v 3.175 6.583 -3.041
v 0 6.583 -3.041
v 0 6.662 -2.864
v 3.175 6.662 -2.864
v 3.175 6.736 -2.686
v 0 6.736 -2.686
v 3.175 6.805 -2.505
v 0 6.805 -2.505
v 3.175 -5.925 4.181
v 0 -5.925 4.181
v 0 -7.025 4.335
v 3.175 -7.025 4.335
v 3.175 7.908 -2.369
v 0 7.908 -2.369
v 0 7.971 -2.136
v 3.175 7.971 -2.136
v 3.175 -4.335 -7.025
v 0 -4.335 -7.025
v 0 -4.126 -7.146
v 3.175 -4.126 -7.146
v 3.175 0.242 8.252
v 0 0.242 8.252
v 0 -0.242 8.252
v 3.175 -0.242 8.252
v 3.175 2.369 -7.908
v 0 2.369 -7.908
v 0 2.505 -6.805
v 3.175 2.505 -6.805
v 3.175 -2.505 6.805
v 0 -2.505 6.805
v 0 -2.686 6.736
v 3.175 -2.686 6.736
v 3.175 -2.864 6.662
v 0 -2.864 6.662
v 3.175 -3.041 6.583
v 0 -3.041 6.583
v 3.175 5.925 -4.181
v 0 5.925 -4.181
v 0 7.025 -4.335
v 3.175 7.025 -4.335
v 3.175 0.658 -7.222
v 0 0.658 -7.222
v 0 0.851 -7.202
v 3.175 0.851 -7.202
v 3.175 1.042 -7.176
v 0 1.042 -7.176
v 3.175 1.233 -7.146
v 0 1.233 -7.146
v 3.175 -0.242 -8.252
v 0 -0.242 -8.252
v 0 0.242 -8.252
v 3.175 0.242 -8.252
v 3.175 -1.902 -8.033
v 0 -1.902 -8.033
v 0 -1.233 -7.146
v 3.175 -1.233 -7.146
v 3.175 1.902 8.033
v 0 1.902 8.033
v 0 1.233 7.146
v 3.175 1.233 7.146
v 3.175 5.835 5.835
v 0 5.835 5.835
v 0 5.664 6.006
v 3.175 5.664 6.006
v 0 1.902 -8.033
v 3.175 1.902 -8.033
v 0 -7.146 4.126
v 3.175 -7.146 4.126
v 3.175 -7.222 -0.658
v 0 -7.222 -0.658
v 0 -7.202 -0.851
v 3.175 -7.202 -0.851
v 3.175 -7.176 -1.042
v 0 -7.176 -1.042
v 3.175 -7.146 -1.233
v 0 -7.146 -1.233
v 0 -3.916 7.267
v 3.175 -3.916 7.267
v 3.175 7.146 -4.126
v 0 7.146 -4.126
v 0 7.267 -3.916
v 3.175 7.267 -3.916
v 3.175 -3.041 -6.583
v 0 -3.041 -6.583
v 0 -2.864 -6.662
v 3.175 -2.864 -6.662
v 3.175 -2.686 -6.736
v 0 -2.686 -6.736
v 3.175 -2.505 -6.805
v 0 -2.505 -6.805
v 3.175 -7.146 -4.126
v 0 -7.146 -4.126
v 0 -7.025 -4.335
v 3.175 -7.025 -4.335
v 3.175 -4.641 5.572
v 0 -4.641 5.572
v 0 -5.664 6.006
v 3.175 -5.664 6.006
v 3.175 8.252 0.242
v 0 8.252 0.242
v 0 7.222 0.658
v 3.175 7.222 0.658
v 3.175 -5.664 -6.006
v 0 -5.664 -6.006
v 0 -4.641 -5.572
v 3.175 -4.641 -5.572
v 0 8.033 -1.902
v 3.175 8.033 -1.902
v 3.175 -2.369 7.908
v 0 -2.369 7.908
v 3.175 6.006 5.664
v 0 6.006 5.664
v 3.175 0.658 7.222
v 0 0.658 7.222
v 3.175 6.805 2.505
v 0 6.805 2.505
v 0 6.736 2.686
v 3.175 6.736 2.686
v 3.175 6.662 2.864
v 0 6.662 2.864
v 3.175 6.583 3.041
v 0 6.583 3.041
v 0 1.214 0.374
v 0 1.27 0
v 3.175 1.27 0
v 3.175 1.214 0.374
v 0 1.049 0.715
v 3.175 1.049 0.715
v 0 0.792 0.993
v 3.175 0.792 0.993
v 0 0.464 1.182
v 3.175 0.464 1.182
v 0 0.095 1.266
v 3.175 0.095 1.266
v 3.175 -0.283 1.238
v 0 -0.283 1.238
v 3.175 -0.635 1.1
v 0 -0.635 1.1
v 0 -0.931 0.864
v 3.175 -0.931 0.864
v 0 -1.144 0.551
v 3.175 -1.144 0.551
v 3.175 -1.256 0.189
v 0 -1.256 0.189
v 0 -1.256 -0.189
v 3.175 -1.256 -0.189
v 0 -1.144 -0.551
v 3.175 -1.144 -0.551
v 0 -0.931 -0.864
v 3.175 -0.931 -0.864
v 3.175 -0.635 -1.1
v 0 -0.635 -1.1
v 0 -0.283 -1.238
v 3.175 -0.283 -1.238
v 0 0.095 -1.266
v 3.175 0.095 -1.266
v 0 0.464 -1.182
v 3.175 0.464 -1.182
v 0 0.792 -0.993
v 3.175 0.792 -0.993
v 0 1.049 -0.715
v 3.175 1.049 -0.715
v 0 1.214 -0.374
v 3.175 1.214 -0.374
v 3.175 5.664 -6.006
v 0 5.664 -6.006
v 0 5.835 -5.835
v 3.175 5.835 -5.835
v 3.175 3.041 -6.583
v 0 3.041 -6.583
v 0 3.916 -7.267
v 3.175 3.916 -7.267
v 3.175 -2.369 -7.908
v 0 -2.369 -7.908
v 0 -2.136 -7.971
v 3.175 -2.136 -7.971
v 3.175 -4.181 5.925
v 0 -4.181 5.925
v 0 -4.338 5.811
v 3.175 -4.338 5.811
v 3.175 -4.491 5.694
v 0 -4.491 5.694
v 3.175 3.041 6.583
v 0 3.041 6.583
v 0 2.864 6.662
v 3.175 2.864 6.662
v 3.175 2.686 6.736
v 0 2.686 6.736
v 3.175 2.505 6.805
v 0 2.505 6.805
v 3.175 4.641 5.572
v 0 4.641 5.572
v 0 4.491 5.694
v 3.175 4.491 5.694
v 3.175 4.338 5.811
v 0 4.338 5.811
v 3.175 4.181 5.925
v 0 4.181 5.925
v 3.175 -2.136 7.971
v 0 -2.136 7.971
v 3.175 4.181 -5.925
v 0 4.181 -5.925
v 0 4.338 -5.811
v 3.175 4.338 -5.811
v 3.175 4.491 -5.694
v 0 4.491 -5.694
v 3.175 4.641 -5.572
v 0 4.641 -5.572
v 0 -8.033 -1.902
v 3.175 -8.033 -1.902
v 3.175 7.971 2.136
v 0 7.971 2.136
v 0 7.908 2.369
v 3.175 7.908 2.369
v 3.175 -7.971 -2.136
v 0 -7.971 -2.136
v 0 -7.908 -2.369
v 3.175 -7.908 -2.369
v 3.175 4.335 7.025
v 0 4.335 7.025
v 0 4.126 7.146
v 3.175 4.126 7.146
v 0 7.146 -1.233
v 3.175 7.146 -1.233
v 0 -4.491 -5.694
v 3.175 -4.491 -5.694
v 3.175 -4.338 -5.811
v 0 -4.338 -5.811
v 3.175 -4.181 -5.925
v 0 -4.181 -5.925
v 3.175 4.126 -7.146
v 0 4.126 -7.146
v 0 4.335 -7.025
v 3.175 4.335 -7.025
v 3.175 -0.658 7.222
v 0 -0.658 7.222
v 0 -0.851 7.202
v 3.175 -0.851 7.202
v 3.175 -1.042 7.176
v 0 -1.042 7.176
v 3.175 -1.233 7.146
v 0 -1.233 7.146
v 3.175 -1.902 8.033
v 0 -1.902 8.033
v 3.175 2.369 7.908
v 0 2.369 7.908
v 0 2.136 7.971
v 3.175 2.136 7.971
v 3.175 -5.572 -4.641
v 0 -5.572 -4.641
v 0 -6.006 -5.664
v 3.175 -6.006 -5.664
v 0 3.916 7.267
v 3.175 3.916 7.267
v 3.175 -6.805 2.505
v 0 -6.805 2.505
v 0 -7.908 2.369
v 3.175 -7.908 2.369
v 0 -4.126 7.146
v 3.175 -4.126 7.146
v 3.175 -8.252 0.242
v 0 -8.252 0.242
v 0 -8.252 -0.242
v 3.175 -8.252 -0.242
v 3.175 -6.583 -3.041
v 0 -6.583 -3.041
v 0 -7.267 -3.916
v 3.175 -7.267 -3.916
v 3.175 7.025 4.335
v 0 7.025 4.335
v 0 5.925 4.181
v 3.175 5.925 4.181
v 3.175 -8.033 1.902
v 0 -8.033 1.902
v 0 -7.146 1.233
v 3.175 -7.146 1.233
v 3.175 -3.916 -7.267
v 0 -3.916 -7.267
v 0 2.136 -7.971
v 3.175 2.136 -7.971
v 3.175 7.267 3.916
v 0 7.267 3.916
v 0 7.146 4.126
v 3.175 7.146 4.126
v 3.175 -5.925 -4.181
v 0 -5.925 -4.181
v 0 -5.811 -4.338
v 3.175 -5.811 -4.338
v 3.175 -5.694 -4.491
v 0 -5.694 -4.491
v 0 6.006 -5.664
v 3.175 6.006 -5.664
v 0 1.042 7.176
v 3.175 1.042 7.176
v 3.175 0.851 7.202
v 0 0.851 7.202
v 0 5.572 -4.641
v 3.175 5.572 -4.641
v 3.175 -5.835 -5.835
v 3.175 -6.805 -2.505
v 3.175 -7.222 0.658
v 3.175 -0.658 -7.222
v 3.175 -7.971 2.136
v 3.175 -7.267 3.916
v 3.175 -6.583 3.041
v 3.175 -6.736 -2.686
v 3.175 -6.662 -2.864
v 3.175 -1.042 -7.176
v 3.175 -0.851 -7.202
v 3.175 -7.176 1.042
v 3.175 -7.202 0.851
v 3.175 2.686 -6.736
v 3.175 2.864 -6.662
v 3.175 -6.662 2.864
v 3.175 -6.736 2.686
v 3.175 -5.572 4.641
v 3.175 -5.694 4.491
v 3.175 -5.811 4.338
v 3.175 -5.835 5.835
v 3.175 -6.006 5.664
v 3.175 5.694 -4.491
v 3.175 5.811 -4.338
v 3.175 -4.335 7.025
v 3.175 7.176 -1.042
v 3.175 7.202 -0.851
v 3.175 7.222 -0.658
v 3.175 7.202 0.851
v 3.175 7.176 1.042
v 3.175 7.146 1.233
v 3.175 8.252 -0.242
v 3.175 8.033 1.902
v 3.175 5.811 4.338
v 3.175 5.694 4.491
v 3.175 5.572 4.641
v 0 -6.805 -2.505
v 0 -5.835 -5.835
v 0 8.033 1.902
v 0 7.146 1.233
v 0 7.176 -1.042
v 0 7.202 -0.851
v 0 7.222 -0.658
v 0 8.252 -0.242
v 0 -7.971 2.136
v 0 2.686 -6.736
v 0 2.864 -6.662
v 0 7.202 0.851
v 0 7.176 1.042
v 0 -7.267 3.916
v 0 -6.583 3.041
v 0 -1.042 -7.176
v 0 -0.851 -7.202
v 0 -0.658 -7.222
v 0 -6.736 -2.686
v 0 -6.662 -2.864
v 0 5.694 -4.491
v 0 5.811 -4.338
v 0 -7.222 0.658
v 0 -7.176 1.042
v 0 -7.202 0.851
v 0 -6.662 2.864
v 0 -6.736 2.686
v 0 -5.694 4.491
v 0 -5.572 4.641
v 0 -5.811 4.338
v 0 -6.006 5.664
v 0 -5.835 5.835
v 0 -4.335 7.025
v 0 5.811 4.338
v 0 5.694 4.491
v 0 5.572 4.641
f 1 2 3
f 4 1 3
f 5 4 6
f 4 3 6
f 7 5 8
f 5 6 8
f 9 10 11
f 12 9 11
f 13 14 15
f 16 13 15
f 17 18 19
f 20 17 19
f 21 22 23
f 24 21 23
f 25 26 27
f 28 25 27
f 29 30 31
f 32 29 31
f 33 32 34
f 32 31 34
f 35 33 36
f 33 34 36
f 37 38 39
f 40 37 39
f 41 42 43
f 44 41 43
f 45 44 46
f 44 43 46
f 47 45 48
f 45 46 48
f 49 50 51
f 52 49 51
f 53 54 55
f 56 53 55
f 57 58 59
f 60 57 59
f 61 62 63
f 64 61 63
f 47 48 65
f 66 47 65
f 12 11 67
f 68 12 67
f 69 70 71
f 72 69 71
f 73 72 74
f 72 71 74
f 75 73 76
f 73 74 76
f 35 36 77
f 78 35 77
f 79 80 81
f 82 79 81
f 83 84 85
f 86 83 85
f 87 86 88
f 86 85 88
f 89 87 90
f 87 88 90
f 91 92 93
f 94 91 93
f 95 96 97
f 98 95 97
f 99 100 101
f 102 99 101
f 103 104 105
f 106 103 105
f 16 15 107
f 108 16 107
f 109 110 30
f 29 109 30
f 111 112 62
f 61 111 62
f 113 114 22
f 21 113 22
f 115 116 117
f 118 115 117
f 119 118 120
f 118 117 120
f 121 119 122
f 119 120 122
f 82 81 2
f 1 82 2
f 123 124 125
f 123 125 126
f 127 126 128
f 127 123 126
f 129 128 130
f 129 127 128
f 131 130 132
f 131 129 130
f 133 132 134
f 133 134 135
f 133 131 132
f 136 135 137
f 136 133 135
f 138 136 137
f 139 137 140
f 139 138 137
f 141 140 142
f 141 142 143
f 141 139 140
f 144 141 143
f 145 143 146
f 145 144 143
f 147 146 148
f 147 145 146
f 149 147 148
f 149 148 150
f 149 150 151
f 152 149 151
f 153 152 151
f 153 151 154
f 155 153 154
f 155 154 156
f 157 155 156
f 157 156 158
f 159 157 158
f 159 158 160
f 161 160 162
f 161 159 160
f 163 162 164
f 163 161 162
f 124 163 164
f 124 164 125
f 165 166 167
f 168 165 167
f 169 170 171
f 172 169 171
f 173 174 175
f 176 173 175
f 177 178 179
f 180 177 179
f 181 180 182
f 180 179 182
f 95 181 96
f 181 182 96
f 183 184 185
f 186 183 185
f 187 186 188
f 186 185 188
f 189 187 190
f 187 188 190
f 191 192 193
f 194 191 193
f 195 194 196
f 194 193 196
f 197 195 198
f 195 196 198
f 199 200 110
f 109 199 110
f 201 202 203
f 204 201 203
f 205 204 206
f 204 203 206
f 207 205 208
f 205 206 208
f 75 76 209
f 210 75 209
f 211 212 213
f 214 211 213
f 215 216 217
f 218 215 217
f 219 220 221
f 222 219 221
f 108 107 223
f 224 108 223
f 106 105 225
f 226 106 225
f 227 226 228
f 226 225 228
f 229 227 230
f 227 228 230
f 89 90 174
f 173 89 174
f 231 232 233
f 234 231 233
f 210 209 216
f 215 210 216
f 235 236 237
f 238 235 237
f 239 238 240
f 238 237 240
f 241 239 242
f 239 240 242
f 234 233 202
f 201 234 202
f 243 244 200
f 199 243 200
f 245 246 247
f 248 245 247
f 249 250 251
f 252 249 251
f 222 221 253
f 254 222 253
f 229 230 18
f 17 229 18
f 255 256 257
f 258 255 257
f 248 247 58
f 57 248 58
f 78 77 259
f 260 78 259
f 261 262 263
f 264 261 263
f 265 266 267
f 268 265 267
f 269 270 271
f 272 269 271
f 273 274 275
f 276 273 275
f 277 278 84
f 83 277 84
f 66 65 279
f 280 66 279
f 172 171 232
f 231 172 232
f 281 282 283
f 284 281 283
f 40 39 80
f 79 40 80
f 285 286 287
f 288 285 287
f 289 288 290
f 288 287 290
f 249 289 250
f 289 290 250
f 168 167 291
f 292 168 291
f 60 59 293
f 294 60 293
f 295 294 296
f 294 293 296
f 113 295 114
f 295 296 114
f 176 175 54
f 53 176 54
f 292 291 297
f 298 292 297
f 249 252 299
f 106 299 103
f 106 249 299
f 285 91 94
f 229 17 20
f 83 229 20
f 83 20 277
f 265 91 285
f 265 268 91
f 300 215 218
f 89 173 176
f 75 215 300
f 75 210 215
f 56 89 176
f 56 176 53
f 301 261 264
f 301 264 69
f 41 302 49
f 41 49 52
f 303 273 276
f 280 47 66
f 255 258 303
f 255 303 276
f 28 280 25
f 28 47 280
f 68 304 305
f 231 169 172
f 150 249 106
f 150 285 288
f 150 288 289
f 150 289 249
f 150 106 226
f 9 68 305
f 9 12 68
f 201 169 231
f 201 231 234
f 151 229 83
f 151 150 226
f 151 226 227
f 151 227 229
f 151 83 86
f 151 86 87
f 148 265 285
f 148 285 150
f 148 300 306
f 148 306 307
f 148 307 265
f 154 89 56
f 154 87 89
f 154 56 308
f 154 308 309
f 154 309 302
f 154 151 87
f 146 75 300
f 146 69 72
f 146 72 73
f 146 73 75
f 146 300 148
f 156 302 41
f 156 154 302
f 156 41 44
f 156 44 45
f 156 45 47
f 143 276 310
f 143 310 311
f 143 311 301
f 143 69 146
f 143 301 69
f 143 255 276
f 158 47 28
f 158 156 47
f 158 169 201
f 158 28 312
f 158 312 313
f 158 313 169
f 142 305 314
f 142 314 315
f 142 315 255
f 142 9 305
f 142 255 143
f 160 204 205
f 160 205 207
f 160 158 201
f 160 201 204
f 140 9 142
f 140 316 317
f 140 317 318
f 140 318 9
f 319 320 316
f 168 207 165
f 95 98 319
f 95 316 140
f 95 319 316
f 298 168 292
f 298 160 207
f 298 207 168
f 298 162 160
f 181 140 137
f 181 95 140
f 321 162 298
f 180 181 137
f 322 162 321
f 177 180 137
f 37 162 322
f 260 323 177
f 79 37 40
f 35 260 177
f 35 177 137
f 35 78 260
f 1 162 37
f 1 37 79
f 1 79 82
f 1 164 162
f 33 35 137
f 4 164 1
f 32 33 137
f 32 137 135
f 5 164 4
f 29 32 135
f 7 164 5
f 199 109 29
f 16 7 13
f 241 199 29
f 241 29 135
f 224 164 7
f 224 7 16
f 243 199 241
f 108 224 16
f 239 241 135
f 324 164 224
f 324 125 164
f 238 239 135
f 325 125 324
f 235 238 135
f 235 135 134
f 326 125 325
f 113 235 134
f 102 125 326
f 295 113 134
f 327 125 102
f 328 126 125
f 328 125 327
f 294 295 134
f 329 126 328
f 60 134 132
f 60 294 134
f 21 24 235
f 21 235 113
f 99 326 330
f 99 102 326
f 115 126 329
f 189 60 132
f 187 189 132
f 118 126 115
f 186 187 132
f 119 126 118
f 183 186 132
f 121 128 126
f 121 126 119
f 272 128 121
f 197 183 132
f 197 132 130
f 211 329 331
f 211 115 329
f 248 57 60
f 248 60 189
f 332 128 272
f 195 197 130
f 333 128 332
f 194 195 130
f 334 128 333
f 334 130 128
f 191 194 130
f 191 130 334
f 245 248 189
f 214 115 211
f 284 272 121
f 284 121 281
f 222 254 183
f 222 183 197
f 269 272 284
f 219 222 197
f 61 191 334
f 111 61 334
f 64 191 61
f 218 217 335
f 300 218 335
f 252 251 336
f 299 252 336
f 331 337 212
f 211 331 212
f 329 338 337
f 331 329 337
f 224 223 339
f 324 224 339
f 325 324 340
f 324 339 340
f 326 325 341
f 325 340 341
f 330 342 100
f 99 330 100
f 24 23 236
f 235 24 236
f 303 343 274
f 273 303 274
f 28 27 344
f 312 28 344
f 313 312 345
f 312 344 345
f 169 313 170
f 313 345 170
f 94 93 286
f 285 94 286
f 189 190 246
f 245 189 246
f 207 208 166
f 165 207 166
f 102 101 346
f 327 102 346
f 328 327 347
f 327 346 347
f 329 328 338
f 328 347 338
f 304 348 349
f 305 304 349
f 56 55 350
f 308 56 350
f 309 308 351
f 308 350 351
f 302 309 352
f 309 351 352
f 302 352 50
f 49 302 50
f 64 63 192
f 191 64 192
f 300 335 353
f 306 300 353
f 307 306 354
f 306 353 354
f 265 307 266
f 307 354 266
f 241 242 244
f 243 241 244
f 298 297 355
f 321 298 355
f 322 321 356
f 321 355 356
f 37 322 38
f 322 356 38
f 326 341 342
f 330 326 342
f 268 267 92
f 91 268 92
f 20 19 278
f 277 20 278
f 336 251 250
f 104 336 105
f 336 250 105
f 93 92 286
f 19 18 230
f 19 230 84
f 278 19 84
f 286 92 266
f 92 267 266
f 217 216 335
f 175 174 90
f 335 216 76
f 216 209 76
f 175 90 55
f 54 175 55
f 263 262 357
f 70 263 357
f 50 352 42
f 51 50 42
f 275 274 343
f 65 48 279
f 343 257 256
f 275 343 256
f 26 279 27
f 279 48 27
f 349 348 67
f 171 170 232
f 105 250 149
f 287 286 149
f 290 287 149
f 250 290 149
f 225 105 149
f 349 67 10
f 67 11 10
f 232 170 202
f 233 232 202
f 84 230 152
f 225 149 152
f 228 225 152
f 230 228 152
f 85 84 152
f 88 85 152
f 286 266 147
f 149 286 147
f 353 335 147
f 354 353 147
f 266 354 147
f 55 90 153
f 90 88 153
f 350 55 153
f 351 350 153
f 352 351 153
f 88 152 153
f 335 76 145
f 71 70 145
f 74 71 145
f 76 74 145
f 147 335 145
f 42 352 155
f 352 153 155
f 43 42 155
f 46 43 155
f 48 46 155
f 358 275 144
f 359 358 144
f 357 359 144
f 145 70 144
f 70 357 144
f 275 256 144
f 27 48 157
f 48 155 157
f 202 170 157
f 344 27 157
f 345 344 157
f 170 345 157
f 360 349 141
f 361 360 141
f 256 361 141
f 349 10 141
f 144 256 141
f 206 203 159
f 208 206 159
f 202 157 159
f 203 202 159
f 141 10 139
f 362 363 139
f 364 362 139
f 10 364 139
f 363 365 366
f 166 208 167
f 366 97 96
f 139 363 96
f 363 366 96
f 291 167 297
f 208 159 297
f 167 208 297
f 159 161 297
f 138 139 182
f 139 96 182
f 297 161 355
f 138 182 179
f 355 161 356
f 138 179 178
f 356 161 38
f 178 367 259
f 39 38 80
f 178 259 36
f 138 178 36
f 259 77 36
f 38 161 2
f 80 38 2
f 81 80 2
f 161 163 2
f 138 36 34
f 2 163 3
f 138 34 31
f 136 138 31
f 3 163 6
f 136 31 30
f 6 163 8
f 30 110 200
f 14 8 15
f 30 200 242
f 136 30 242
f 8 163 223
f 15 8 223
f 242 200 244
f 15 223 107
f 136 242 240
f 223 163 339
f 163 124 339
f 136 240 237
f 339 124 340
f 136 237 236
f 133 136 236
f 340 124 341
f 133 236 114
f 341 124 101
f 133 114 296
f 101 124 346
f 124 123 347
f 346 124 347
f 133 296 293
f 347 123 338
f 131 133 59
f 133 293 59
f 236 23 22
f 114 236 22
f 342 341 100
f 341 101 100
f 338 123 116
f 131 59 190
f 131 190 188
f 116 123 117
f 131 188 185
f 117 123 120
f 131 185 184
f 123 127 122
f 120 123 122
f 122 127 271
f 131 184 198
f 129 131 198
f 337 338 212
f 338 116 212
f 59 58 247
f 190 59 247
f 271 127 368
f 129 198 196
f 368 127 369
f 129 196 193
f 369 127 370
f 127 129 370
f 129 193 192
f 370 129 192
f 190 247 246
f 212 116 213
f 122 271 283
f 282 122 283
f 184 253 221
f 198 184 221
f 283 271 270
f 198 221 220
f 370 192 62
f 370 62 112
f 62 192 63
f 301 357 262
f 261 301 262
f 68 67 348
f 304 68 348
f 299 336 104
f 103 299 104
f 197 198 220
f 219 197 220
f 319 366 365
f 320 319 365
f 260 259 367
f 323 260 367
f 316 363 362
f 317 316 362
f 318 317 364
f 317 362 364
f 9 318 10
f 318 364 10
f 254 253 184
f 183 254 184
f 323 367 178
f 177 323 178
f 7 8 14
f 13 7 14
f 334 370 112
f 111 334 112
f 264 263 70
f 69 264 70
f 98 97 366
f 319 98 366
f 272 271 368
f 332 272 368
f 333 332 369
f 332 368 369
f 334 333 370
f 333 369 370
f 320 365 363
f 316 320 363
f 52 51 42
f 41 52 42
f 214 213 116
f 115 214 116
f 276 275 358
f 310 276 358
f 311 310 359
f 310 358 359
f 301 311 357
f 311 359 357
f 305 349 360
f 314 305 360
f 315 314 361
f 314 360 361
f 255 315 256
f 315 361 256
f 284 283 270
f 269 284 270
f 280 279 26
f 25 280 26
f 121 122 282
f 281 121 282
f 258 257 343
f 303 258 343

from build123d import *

# Parameters (mm, degrees)
F0_R     = 1.27
F1_DEPTH = 3.175


with BuildPart() as f1:
    # F0 (on Right) → F1 (new body)
    with BuildSketch(Plane.YZ):
        with BuildLine():
            ThreePointArc((-0.658468, 7.221743), (0, 7.2517), (0.658468, 7.221743))
            Line((0.658468, 7.221743), (0.241805, 8.251701))
            Line((0.241805, 8.251701), (0, 8.251701))
            Line((0, 8.251701), (-0.241805, 8.251701))
            Line((-0.241805, 8.251701), (-0.658468, 7.221743))
        make_face()
        with BuildLine():
            ThreePointArc((7.221743, -0.658468), (7.244207, -0.329575), (7.2517, 0))
            ThreePointArc((7.2517, 0), (7.244207, 0.329575), (7.221743, 0.658468))
            ThreePointArc((7.221743, 0.658468), (7.189661, 0.946537), (7.146092, 1.233093))
            ThreePointArc((7.146092, 1.233093), (7.004604, 1.876878), (6.805244, 2.505156))
            ThreePointArc((6.805244, 2.505156), (6.699697, 2.775105), (6.583447, 3.040622))
            ThreePointArc((6.583447, 3.040622), (6.280156, 3.62585), (5.924979, 4.181121))
            ThreePointArc((5.924979, 4.181121), (5.75316, 4.414555), (5.572151, 4.640936))
            ThreePointArc((5.572151, 4.640936), (5.127726, 5.127726), (4.640936, 5.572151))
            ThreePointArc((4.640936, 5.572151), (4.414555, 5.75316), (4.181121, 5.924979))
            ThreePointArc((4.181121, 5.924979), (3.62585, 6.280156), (3.040622, 6.583447))
            ThreePointArc((3.040622, 6.583447), (2.775105, 6.699697), (2.505156, 6.805244))
            ThreePointArc((2.505156, 6.805244), (1.876878, 7.004604), (1.233093, 7.146092))
            ThreePointArc((1.233093, 7.146092), (0.946537, 7.189661), (0.658468, 7.221743))
            ThreePointArc((0.658468, 7.221743), (0, 7.2517), (-0.658468, 7.221743))
            ThreePointArc((-0.658468, 7.221743), (-0.946537, 7.189661), (-1.233093, 7.146092))
            ThreePointArc((-1.233093, 7.146092), (-1.876878, 7.004604), (-2.505156, 6.805244))
            ThreePointArc((-2.505156, 6.805244), (-2.775105, 6.699697), (-3.040622, 6.583447))
            ThreePointArc((-3.040622, 6.583447), (-3.62585, 6.280156), (-4.181121, 5.924979))
            ThreePointArc((-4.181121, 5.924979), (-4.414555, 5.75316), (-4.640936, 5.572151))
            ThreePointArc((-4.640936, 5.572151), (-5.127726, 5.127726), (-5.572151, 4.640936))
            ThreePointArc((-5.572151, 4.640936), (-5.75316, 4.414555), (-5.924979, 4.181121))
            ThreePointArc((-5.924979, 4.181121), (-6.280156, 3.62585), (-6.583447, 3.040622))
            ThreePointArc((-6.583447, 3.040622), (-6.699697, 2.775105), (-6.805244, 2.505156))
            ThreePointArc((-6.805244, 2.505156), (-7.004604, 1.876878), (-7.146092, 1.233093))
            ThreePointArc((-7.146092, 1.233093), (-7.189661, 0.946537), (-7.221743, 0.658468))
            ThreePointArc((-7.221743, 0.658468), (-7.2517, 0), (-7.221743, -0.658468))
            ThreePointArc((-7.221743, -0.658468), (-7.189661, -0.946537), (-7.146092, -1.233093))
            ThreePointArc((-7.146092, -1.233093), (-7.004604, -1.876878), (-6.805244, -2.505156))
            ThreePointArc((-6.805244, -2.505156), (-6.699697, -2.775105), (-6.583447, -3.040622))
            ThreePointArc((-6.583447, -3.040622), (-6.280156, -3.62585), (-5.924979, -4.181121))
            ThreePointArc((-5.924979, -4.181121), (-5.75316, -4.414555), (-5.572151, -4.640936))
            ThreePointArc((-5.572151, -4.640936), (-5.127726, -5.127726), (-4.640936, -5.572151))
            ThreePointArc((-4.640936, -5.572151), (-4.414555, -5.75316), (-4.181121, -5.924979))
            ThreePointArc((-4.181121, -5.924979), (-3.62585, -6.280156), (-3.040622, -6.583447))
            ThreePointArc((-3.040622, -6.583447), (-2.775105, -6.699697), (-2.505156, -6.805244))
            ThreePointArc((-2.505156, -6.805244), (-1.876878, -7.004604), (-1.233093, -7.146092))
            ThreePointArc((-1.233093, -7.146092), (-0.946537, -7.189661), (-0.658468, -7.221743))
            ThreePointArc((-0.658468, -7.221743), (0, -7.2517), (0.658468, -7.221743))
            ThreePointArc((0.658468, -7.221743), (0.946537, -7.189661), (1.233093, -7.146092))
            ThreePointArc((1.233093, -7.146092), (1.876878, -7.004604), (2.505156, -6.805244))
            ThreePointArc((2.505156, -6.805244), (2.775105, -6.699697), (3.040622, -6.583447))
            ThreePointArc((3.040622, -6.583447), (3.62585, -6.280156), (4.181121, -5.924979))
            ThreePointArc((4.181121, -5.924979), (4.414555, -5.75316), (4.640936, -5.572151))
            ThreePointArc((4.640936, -5.572151), (5.127726, -5.127726), (5.572151, -4.640936))
            ThreePointArc((5.572151, -4.640936), (5.75316, -4.414555), (5.924979, -4.181121))
            ThreePointArc((5.924979, -4.181121), (6.280156, -3.62585), (6.583447, -3.040622))
            ThreePointArc((6.583447, -3.040622), (6.699697, -2.775105), (6.805244, -2.505156))
            ThreePointArc((6.805244, -2.505156), (7.004604, -1.876878), (7.146092, -1.233093))
            ThreePointArc((7.146092, -1.233093), (7.189661, -0.946537), (7.221743, -0.658468))
        make_face()
        Circle(F0_R, mode=Mode.SUBTRACT)
        with BuildLine():
            ThreePointArc((1.233093, 7.146092), (1.876878, 7.004604), (2.505156, 6.805244))
            Line((2.505156, 6.805244), (2.369263, 7.907947))
            Line((2.369263, 7.907947), (2.135697, 7.970531))
            Line((2.135697, 7.970531), (1.902131, 8.033114))
            Line((1.902131, 8.033114), (1.233093, 7.146092))
        make_face()
        with BuildLine():
            ThreePointArc((3.040622, 6.583447), (3.62585, 6.280156), (4.181121, 5.924979))
            Line((4.181121, 5.924979), (4.33526, 7.02528))
            Line((4.33526, 7.02528), (4.12585, 7.146182))
            Line((4.12585, 7.146182), (3.916441, 7.267085))
            Line((3.916441, 7.267085), (3.040622, 6.583447))
        make_face()
        with BuildLine():
            ThreePointArc((4.640936, 5.572151), (5.127726, 5.127726), (5.572151, 4.640936))
            Line((5.572151, 4.640936), (6.005816, 5.663851))
            Line((6.005816, 5.663851), (5.834833, 5.834833))
            Line((5.834833, 5.834833), (5.663851, 6.005816))
            Line((5.663851, 6.005816), (4.640936, 5.572151))
        make_face()
        with BuildLine():
            ThreePointArc((5.924979, 4.181121), (6.280156, 3.62585), (6.583447, 3.040622))
            Line((6.583447, 3.040622), (7.267085, 3.916441))
            Line((7.267085, 3.916441), (7.146182, 4.12585))
            Line((7.146182, 4.12585), (7.02528, 4.33526))
            Line((7.02528, 4.33526), (5.924979, 4.181121))
        make_face()
        with BuildLine():
            ThreePointArc((6.805244, 2.505156), (7.004604, 1.876878), (7.146092, 1.233093))
            Line((7.146092, 1.233093), (8.033114, 1.902131))
            Line((8.033114, 1.902131), (7.970531, 2.135697))
            Line((7.970531, 2.135697), (7.907947, 2.369263))
            Line((7.907947, 2.369263), (6.805244, 2.505156))
        make_face()
        with BuildLine():
            ThreePointArc((7.221743, 0.658468), (7.244207, 0.329575), (7.2517, 0))
            ThreePointArc((7.2517, 0), (7.244207, -0.329575), (7.221743, -0.658468))
            Line((7.221743, -0.658468), (8.251701, -0.241805))
            Line((8.251701, -0.241805), (8.251701, 0))
            Line((8.251701, 0), (8.251701, 0.241805))
            Line((8.251701, 0.241805), (7.221743, 0.658468))
        make_face()
        with BuildLine():
            Line((8.033114, -1.902131), (7.146092, -1.233093))
            ThreePointArc((7.146092, -1.233093), (7.004604, -1.876878), (6.805244, -2.505156))
            Line((6.805244, -2.505156), (7.907947, -2.369263))
            Line((7.907947, -2.369263), (7.970531, -2.135697))
            Line((7.970531, -2.135697), (8.033114, -1.902131))
        make_face()
        with BuildLine():
            Line((7.267085, -3.916441), (6.583447, -3.040622))
            ThreePointArc((6.583447, -3.040622), (6.280156, -3.62585), (5.924979, -4.181121))
            Line((5.924979, -4.181121), (7.02528, -4.33526))
            Line((7.02528, -4.33526), (7.146182, -4.12585))
            Line((7.146182, -4.12585), (7.267085, -3.916441))
        make_face()
        with BuildLine():
            Line((6.005816, -5.663851), (5.572151, -4.640936))
            ThreePointArc((5.572151, -4.640936), (5.127726, -5.127726), (4.640936, -5.572151))
            Line((4.640936, -5.572151), (5.663851, -6.005816))
            Line((5.663851, -6.005816), (5.834833, -5.834833))
            Line((5.834833, -5.834833), (6.005816, -5.663851))
        make_face()
        with BuildLine():
            Line((4.33526, -7.02528), (4.181121, -5.924979))
            ThreePointArc((4.181121, -5.924979), (3.62585, -6.280156), (3.040622, -6.583447))
            Line((3.040622, -6.583447), (3.916441, -7.267085))
            Line((3.916441, -7.267085), (4.12585, -7.146182))
            Line((4.12585, -7.146182), (4.33526, -7.02528))
        make_face()
        with BuildLine():
            Line((2.369263, -7.907947), (2.505156, -6.805244))
            ThreePointArc((2.505156, -6.805244), (1.876878, -7.004604), (1.233093, -7.146092))
            Line((1.233093, -7.146092), (1.902131, -8.033114))
            Line((1.902131, -8.033114), (2.135697, -7.970531))
            Line((2.135697, -7.970531), (2.369263, -7.907947))
        make_face()
        with BuildLine():
            Line((0.241805, -8.251701), (0.658468, -7.221743))
            ThreePointArc((0.658468, -7.221743), (0, -7.2517), (-0.658468, -7.221743))
            Line((-0.658468, -7.221743), (-0.241805, -8.251701))
            Line((-0.241805, -8.251701), (0, -8.251701))
            Line((0, -8.251701), (0.241805, -8.251701))
        make_face()
        with BuildLine():
            Line((-1.902131, -8.033114), (-1.233093, -7.146092))
            ThreePointArc((-1.233093, -7.146092), (-1.876878, -7.004604), (-2.505156, -6.805244))
            Line((-2.505156, -6.805244), (-2.369263, -7.907947))
            Line((-2.369263, -7.907947), (-2.135697, -7.970531))
            Line((-2.135697, -7.970531), (-1.902131, -8.033114))
        make_face()
        with BuildLine():
            Line((-3.916441, -7.267085), (-3.040622, -6.583447))
            ThreePointArc((-3.040622, -6.583447), (-3.62585, -6.280156), (-4.181121, -5.924979))
            Line((-4.181121, -5.924979), (-4.33526, -7.02528))
            Line((-4.33526, -7.02528), (-4.12585, -7.146182))
            Line((-4.12585, -7.146182), (-3.916441, -7.267085))
        make_face()
        with BuildLine():
            Line((-5.663851, -6.005816), (-4.640936, -5.572151))
            ThreePointArc((-4.640936, -5.572151), (-5.127726, -5.127726), (-5.572151, -4.640936))
            Line((-5.572151, -4.640936), (-6.005816, -5.663851))
            Line((-6.005816, -5.663851), (-5.834833, -5.834833))
            Line((-5.834833, -5.834833), (-5.663851, -6.005816))
        make_face()
        with BuildLine():
            Line((-7.02528, -4.33526), (-5.924979, -4.181121))
            ThreePointArc((-5.924979, -4.181121), (-6.280156, -3.62585), (-6.583447, -3.040622))
            Line((-6.583447, -3.040622), (-7.267085, -3.916441))
            Line((-7.267085, -3.916441), (-7.146182, -4.12585))
            Line((-7.146182, -4.12585), (-7.02528, -4.33526))
        make_face()
        with BuildLine():
            ThreePointArc((-7.221743, -0.658468), (-7.2517, 0), (-7.221743, 0.658468))
            Line((-7.221743, 0.658468), (-8.251701, 0.241805))
            Line((-8.251701, 0.241805), (-8.251701, 0))
            Line((-8.251701, 0), (-8.251701, -0.241805))
            Line((-8.251701, -0.241805), (-7.221743, -0.658468))
        make_face()
        with BuildLine():
            ThreePointArc((-7.146092, 1.233093), (-7.004604, 1.876878), (-6.805244, 2.505156))
            Line((-6.805244, 2.505156), (-7.907947, 2.369263))
            Line((-7.907947, 2.369263), (-7.970531, 2.135697))
            Line((-7.970531, 2.135697), (-8.033114, 1.902131))
            Line((-8.033114, 1.902131), (-7.146092, 1.233093))
        make_face()
        with BuildLine():
            ThreePointArc((-6.583447, 3.040622), (-6.280156, 3.62585), (-5.924979, 4.181121))
            Line((-5.924979, 4.181121), (-7.02528, 4.33526))
            Line((-7.02528, 4.33526), (-7.146182, 4.12585))
            Line((-7.146182, 4.12585), (-7.267085, 3.916441))
            Line((-7.267085, 3.916441), (-6.583447, 3.040622))
        make_face()
        with BuildLine():
            ThreePointArc((-5.572151, 4.640936), (-5.127726, 5.127726), (-4.640936, 5.572151))
            Line((-4.640936, 5.572151), (-5.663851, 6.005816))
            Line((-5.663851, 6.005816), (-5.834833, 5.834833))
            Line((-5.834833, 5.834833), (-6.005816, 5.663851))
            Line((-6.005816, 5.663851), (-5.572151, 4.640936))
        make_face()
        with BuildLine():
            ThreePointArc((-4.181121, 5.924979), (-3.62585, 6.280156), (-3.040622, 6.583447))
            Line((-3.040622, 6.583447), (-3.916441, 7.267085))
            Line((-3.916441, 7.267085), (-4.12585, 7.146182))
            Line((-4.12585, 7.146182), (-4.33526, 7.02528))
            Line((-4.33526, 7.02528), (-4.181121, 5.924979))
        make_face()
        with BuildLine():
            ThreePointArc((-2.505156, 6.805244), (-1.876878, 7.004604), (-1.233093, 7.146092))
            Line((-1.233093, 7.146092), (-1.902131, 8.033114))
            Line((-1.902131, 8.033114), (-2.135697, 7.970531))
            Line((-2.135697, 7.970531), (-2.369263, 7.907947))
            Line((-2.369263, 7.907947), (-2.505156, 6.805244))
        make_face()
        with BuildLine():
            Line((-7.907947, -2.369263), (-6.805244, -2.505156))
            ThreePointArc((-6.805244, -2.505156), (-7.004604, -1.876878), (-7.146092, -1.233093))
            Line((-7.146092, -1.233093), (-8.033114, -1.902131))
            Line((-8.033114, -1.902131), (-7.970531, -2.135697))
            Line((-7.970531, -2.135697), (-7.907947, -2.369263))
        make_face()
    extrude(amount=F1_DEPTH)


solid = f1.part
